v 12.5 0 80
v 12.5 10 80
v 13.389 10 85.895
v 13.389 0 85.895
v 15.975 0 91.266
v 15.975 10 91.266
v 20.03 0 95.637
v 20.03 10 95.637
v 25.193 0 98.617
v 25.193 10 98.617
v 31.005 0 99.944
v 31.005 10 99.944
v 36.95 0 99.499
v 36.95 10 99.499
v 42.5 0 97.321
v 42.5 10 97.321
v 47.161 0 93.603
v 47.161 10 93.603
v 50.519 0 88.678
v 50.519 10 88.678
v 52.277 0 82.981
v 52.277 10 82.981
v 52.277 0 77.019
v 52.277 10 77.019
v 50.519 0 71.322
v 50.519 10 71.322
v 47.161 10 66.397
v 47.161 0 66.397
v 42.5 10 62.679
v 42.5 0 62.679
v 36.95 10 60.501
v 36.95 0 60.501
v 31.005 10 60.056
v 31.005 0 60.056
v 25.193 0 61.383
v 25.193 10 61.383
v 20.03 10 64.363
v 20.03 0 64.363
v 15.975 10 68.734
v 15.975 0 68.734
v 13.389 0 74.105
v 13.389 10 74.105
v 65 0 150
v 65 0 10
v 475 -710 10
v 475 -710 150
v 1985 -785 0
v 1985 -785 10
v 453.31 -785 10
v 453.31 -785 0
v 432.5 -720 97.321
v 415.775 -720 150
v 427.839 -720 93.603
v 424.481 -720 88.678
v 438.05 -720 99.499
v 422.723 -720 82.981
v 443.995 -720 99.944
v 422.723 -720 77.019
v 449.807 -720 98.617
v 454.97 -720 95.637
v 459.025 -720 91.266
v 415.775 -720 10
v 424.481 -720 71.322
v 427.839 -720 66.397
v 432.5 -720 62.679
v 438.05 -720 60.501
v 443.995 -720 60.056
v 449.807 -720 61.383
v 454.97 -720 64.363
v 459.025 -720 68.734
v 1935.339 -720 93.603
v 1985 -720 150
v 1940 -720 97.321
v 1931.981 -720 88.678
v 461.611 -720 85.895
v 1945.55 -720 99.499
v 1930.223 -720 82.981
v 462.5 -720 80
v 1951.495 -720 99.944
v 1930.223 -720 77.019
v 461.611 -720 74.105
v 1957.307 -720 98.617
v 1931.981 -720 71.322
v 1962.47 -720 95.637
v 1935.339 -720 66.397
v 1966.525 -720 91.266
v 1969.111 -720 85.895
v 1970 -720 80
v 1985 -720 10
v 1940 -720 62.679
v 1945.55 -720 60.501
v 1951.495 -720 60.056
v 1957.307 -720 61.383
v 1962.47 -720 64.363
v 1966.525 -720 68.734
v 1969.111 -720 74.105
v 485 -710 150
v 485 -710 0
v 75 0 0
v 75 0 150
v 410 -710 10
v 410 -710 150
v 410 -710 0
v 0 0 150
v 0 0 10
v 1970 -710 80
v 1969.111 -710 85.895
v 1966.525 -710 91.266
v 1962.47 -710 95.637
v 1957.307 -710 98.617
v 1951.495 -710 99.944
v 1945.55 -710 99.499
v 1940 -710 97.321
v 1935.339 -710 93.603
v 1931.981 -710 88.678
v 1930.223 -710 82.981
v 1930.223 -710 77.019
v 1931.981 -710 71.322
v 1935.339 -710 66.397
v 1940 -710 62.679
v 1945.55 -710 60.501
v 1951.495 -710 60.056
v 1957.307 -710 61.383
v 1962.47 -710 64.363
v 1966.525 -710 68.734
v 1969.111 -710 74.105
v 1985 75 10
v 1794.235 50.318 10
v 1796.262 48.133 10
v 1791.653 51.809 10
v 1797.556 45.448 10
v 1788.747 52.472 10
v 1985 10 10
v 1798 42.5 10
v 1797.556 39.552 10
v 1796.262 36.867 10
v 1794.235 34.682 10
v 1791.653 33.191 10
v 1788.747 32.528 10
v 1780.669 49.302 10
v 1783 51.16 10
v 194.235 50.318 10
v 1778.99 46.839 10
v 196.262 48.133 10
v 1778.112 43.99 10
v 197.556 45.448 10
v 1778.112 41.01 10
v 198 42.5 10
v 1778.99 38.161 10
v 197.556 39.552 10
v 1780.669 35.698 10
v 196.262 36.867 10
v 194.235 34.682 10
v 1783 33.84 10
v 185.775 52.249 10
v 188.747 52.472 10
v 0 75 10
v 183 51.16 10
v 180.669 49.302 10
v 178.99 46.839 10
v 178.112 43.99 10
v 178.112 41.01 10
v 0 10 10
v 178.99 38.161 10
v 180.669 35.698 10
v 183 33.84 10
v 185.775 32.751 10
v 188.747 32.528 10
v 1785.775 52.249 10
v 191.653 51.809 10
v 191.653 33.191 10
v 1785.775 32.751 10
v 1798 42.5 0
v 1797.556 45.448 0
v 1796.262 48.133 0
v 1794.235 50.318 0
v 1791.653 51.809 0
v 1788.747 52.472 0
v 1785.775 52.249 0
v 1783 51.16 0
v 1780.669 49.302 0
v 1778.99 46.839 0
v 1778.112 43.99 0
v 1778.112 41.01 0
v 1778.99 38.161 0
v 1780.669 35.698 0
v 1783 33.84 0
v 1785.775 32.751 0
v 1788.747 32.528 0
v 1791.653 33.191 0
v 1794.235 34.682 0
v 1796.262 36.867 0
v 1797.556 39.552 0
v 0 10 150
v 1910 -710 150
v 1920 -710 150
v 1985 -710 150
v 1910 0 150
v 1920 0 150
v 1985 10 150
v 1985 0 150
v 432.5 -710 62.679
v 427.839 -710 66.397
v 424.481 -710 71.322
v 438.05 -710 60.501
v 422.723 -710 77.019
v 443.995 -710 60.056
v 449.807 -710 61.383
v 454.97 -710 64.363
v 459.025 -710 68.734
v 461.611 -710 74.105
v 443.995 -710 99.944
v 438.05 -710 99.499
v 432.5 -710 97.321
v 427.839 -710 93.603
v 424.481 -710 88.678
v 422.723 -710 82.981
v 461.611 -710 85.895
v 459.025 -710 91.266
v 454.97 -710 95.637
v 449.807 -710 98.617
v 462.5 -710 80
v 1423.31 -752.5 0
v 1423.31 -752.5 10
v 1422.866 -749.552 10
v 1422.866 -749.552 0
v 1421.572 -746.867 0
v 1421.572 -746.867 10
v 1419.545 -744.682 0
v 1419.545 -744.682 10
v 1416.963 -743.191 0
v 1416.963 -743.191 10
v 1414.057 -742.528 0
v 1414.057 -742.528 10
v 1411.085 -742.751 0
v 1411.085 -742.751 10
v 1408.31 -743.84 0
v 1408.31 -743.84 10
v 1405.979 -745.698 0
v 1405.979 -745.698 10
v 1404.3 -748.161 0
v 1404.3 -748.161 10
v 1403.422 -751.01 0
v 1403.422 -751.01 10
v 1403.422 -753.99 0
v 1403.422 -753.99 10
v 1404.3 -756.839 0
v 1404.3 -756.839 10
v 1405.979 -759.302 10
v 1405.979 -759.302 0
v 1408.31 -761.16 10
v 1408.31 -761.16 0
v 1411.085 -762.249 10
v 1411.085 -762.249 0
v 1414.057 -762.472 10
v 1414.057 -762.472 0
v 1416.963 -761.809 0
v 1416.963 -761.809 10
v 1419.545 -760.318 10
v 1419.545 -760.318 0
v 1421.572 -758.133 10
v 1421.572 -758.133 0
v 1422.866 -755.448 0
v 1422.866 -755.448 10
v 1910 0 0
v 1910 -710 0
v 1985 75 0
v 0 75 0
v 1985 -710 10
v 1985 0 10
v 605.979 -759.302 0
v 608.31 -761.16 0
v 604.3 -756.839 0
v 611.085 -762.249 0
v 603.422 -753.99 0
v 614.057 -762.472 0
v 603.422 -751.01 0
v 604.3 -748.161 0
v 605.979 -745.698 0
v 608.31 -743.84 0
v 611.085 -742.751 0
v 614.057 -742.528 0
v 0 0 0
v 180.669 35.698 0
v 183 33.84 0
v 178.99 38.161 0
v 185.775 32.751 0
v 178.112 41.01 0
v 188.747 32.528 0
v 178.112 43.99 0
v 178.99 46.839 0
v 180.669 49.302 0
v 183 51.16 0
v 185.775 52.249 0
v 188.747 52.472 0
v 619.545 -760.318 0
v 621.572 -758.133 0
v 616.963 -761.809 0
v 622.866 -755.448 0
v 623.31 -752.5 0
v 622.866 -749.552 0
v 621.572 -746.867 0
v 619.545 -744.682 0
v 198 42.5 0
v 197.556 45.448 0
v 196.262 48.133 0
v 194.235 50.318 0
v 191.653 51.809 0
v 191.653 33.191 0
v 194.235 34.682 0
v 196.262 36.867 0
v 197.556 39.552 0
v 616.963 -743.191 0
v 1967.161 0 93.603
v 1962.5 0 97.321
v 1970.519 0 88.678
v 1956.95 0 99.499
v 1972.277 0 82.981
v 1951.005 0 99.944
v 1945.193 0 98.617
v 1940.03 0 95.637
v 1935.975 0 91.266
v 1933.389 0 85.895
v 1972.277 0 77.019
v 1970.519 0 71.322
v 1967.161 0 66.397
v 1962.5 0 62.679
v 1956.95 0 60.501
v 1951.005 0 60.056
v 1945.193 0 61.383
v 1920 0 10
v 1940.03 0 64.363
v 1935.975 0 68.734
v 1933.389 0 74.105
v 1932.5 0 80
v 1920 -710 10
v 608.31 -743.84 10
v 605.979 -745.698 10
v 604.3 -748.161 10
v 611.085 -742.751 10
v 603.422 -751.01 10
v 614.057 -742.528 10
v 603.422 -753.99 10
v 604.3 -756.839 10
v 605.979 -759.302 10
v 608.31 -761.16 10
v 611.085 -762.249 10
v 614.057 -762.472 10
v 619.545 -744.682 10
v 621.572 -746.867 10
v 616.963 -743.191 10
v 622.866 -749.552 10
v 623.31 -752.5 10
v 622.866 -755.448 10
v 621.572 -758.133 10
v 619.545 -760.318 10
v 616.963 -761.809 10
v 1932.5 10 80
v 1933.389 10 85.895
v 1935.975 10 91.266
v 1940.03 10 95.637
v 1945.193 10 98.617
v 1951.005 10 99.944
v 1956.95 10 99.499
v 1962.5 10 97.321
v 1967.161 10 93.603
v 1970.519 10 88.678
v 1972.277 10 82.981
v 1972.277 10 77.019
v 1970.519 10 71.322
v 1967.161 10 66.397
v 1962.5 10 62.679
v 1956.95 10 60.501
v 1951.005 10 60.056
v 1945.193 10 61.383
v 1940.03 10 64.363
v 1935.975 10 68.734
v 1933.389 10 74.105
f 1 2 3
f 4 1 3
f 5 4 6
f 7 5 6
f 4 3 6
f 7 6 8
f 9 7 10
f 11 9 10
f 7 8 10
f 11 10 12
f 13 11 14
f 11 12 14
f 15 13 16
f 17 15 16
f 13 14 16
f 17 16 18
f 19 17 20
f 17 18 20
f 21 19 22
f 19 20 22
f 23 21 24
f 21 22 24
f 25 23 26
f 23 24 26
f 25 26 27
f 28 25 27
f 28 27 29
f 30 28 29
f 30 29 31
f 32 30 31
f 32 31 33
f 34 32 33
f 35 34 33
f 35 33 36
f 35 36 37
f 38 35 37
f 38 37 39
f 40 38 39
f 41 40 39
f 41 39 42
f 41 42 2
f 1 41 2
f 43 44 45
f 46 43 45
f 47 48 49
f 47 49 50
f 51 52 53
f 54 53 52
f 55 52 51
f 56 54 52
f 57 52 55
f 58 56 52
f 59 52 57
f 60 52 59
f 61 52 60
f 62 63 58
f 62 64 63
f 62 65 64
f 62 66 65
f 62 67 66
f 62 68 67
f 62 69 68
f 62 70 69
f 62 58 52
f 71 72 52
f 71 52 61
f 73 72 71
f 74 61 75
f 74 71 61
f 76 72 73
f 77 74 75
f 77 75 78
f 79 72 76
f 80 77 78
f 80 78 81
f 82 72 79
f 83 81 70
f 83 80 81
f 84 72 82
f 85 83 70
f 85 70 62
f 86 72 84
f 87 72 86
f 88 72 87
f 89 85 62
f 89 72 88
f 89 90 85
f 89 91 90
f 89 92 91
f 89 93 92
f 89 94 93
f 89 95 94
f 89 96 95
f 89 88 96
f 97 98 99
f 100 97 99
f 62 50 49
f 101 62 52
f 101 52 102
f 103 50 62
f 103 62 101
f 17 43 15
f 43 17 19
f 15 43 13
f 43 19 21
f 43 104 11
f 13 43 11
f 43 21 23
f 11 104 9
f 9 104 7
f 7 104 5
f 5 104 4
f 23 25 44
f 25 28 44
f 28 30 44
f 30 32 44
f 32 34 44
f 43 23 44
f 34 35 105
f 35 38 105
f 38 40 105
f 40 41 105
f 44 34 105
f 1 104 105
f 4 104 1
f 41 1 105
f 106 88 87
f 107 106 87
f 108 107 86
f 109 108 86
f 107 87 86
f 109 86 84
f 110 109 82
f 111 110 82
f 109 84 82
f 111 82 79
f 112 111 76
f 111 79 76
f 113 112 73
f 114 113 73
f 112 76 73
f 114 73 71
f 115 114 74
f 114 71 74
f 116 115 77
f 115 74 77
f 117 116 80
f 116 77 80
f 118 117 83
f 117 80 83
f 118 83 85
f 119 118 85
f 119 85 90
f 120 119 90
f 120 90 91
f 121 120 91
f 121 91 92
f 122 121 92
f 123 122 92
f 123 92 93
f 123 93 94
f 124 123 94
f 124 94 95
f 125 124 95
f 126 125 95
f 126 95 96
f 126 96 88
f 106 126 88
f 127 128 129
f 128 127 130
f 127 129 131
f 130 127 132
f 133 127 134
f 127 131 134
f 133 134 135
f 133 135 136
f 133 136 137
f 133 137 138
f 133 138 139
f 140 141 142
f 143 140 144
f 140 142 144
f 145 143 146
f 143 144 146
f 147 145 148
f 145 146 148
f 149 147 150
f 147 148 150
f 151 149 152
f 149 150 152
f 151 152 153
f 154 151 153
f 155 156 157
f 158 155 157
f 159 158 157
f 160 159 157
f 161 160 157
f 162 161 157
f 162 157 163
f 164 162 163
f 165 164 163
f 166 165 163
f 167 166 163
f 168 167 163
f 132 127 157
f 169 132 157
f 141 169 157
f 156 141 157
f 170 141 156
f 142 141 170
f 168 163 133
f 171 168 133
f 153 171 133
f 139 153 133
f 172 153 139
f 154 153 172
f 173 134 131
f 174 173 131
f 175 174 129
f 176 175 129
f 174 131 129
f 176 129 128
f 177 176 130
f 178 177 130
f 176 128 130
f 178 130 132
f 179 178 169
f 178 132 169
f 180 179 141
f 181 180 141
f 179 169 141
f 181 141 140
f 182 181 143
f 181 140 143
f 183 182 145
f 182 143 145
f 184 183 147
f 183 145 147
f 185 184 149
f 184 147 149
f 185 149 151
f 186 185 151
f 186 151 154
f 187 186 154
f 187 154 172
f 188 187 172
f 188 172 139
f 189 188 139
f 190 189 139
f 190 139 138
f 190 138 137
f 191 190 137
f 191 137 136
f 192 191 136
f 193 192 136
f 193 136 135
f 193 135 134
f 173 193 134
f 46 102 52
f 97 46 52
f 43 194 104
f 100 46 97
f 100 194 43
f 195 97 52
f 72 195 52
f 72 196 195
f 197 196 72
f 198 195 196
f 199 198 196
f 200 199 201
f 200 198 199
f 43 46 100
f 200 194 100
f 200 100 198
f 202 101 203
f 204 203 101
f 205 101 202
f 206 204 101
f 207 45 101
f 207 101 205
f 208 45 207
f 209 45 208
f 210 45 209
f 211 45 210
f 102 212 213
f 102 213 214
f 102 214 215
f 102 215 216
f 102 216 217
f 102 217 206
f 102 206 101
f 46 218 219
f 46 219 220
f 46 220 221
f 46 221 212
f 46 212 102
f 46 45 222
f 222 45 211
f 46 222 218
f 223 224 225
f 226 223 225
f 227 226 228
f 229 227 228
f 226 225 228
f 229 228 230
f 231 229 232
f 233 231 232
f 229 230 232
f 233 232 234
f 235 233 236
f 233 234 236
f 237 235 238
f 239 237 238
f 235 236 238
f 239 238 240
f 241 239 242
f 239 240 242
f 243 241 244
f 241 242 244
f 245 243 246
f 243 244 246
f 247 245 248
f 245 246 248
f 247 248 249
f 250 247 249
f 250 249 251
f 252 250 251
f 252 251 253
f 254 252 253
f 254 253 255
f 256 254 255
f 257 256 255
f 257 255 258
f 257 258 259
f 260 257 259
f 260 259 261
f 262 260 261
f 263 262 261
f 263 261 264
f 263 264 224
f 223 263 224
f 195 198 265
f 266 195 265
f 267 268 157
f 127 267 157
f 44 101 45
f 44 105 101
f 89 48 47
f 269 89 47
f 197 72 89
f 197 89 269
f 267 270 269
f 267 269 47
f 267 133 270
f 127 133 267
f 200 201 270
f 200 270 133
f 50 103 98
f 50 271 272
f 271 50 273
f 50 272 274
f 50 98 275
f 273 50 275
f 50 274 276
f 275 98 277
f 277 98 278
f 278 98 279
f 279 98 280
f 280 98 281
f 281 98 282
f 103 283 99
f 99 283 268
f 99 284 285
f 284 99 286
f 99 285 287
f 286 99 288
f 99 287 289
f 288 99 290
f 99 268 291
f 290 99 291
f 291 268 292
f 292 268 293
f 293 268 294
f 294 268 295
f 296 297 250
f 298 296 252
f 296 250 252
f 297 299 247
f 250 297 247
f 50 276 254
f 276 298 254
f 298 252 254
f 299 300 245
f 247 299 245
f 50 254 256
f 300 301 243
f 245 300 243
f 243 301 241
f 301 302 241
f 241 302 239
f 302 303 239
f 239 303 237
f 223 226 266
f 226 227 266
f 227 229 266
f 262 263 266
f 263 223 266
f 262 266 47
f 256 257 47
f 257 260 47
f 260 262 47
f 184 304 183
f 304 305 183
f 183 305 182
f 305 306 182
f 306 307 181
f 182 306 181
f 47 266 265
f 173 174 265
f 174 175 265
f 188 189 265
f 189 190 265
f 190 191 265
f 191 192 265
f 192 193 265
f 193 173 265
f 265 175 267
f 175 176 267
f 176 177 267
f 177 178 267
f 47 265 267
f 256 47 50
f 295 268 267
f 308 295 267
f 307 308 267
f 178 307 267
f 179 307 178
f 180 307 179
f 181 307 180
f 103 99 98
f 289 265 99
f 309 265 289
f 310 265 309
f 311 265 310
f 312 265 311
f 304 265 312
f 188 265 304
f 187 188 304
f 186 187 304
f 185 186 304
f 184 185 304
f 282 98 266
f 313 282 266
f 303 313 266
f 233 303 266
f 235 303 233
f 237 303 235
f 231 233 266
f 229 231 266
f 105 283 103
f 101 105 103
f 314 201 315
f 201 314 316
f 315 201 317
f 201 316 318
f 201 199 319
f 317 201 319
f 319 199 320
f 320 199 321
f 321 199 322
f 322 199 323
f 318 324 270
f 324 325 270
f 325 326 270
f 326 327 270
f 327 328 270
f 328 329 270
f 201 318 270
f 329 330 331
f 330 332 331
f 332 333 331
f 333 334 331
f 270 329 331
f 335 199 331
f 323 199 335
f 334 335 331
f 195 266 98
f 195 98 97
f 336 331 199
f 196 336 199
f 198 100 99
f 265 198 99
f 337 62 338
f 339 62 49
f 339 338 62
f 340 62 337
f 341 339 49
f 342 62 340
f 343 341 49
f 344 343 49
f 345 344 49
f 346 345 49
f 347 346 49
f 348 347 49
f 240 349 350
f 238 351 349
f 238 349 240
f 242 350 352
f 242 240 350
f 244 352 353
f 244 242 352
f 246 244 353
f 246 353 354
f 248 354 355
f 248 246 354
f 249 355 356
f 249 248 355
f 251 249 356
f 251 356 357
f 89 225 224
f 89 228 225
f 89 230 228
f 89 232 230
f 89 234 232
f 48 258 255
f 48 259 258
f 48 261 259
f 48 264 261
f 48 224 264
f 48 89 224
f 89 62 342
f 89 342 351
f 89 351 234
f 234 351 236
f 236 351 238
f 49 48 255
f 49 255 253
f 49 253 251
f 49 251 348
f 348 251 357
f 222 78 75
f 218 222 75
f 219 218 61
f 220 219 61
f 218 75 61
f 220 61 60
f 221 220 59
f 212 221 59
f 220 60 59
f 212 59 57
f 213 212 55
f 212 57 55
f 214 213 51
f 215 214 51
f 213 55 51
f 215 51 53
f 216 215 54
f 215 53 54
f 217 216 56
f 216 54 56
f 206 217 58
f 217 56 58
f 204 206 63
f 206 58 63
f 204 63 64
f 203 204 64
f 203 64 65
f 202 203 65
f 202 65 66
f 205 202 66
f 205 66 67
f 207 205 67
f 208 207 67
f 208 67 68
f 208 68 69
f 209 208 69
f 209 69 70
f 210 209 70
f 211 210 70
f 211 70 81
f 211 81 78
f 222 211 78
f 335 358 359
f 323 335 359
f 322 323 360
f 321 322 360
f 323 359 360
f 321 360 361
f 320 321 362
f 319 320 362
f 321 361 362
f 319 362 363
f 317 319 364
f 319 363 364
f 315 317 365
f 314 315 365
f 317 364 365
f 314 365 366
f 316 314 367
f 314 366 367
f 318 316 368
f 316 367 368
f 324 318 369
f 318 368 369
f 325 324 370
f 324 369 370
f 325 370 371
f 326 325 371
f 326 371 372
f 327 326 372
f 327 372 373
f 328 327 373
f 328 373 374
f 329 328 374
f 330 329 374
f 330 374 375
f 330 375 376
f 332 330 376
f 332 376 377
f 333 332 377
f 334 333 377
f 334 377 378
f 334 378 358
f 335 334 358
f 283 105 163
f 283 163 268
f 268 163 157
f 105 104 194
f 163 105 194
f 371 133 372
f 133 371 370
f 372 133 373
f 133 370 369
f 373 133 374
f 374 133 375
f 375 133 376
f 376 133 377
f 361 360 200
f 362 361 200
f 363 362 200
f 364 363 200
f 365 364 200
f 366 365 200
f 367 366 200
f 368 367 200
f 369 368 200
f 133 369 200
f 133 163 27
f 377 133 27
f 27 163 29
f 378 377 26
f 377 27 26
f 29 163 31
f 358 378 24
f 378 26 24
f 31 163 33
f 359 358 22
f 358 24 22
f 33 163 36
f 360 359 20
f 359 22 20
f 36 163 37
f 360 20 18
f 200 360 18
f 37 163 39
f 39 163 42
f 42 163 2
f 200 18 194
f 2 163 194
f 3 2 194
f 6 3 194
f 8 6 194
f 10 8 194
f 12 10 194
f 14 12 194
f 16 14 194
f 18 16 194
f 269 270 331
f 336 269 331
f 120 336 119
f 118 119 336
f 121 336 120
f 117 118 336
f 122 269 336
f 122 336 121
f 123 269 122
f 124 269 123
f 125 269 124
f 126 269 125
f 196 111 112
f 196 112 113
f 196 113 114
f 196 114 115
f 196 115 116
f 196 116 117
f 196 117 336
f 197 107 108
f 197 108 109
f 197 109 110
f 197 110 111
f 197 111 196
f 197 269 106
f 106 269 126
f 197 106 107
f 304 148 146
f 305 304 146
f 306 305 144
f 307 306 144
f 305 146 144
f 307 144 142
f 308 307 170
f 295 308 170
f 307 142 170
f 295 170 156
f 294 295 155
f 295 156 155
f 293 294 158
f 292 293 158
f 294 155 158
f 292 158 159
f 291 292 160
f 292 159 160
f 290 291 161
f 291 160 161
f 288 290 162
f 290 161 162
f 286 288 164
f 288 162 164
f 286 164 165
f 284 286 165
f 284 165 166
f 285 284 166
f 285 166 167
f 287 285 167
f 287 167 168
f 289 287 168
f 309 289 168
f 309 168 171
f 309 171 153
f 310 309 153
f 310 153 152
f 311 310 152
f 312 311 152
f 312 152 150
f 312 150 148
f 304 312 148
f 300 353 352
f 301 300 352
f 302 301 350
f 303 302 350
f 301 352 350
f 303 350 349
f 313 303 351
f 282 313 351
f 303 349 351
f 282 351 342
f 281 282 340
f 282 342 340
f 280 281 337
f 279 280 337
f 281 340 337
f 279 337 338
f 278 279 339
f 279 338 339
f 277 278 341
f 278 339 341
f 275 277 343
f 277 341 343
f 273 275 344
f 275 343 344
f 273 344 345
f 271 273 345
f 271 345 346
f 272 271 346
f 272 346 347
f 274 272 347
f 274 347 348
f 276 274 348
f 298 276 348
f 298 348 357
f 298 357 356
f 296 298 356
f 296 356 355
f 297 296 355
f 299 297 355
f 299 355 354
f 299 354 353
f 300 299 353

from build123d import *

# Parameters (mm, degrees)
F1_DEPTH       = 1985
F3_DEPTH       = 710
F5_DEPTH       = 1575
F7_DEPTH       = 10
F9_DEPTH       = 140
F10_R          = 10
F11_DEPTH      = 25
F12_R          = 20
F13_DEPTH      = 15
F14_R          = 20
F15_DEPTH      = 25
F17_DEPTH      = 177
F17_DEPTH_BACK = 25


with BuildPart() as f1:
    # F0 (on Right) → F1 (new body)
    with BuildSketch(Plane.YZ):
        Polygon((0, 10), (0, 0), (10, 0), (75, 0), (75, 10), (10, 10), (10, 150), (0, 150), align=None)
    extrude(amount=F1_DEPTH)

    # F2 (on face) → F3 (join)
    with BuildSketch(Plane.XZ):
        Polygon((1910, 10), (1910, 0), (1920, 0), (1985, 0), (1985, 10), (1920, 10), (1920, 150), (1910, 150), align=None)
    extrude(amount=F3_DEPTH)



with BuildPart() as f5:
    # F4 (on face) → F5 (new body)
    with BuildSketch(Plane.YZ.offset(1985)):
        Polygon((-720, 150), (-720, 10), (-785, 10), (-785, 0), (-720, 0), (-710, 0), (-710, 10), (-710, 150), align=None)
    extrude(amount=-F5_DEPTH)


with BuildPart() as f7:
    # F6 (on Top) → F7 (new body)
    with BuildSketch(Plane.XY):
        Polygon((485, -710), (75, 0), (0, 0), (410, -710), align=None)
    extrude(amount=F7_DEPTH)


with BuildPart() as f1_1:
    add(f1.part)

    add(f5.part)  # F9 merges F5

    add(f7.part)  # F9 merges F7
    # F8 (on face) → F9 (join)
    with BuildSketch(Plane.XY.offset(10)):
        Polygon((485, -710), (75, 0), (65, 0), (475, -710), align=None)
    extrude(amount=F9_DEPTH)

    # F10 (on face) → F11 (cut)
    with BuildSketch(Plane.XY.offset(10)):
        with Locations((613.31, -752.5)):
            Circle(F10_R)
        with Locations((1413.31, -752.5)):
            Circle(F10_R)
        with Locations((1788, 42.5)):
            Circle(F10_R)
        with Locations((188, 42.5)):
            Circle(F10_R)
    extrude(amount=-F11_DEPTH, mode=Mode.SUBTRACT)

    # F12 (on face) → F13 (cut)
    with BuildSketch(Plane.XZ.offset(720)):
        with Locations((442.5, 80)):
            Circle(F12_R)
        with Locations((1950, 80)):
            Circle(F12_R)
    extrude(amount=-F13_DEPTH, mode=Mode.SUBTRACT)

    # F14 (on face) → F15 (cut)
    with BuildSketch(Plane(origin=(0, 10, 0), x_dir=(-1, 0, 0), z_dir=(0, 1, 0))):
        with Locations((-1952.5, 80)):
            Circle(F14_R)
        with Locations((-32.5, 80)):
            Circle(F14_R)
    extrude(amount=-F15_DEPTH, mode=Mode.SUBTRACT)

    # F16 (on face) → F17 (cut, two sides)
    with BuildSketch(Plane.XY.offset(10)) as f17_sk:
        Polygon((453.309859, -785), (410, -710), (410, -785), align=None)
    extrude(amount=F17_DEPTH, mode=Mode.SUBTRACT)
    extrude(f17_sk.sketch, amount=-F17_DEPTH_BACK, mode=Mode.SUBTRACT)


solid = f1_1.part
